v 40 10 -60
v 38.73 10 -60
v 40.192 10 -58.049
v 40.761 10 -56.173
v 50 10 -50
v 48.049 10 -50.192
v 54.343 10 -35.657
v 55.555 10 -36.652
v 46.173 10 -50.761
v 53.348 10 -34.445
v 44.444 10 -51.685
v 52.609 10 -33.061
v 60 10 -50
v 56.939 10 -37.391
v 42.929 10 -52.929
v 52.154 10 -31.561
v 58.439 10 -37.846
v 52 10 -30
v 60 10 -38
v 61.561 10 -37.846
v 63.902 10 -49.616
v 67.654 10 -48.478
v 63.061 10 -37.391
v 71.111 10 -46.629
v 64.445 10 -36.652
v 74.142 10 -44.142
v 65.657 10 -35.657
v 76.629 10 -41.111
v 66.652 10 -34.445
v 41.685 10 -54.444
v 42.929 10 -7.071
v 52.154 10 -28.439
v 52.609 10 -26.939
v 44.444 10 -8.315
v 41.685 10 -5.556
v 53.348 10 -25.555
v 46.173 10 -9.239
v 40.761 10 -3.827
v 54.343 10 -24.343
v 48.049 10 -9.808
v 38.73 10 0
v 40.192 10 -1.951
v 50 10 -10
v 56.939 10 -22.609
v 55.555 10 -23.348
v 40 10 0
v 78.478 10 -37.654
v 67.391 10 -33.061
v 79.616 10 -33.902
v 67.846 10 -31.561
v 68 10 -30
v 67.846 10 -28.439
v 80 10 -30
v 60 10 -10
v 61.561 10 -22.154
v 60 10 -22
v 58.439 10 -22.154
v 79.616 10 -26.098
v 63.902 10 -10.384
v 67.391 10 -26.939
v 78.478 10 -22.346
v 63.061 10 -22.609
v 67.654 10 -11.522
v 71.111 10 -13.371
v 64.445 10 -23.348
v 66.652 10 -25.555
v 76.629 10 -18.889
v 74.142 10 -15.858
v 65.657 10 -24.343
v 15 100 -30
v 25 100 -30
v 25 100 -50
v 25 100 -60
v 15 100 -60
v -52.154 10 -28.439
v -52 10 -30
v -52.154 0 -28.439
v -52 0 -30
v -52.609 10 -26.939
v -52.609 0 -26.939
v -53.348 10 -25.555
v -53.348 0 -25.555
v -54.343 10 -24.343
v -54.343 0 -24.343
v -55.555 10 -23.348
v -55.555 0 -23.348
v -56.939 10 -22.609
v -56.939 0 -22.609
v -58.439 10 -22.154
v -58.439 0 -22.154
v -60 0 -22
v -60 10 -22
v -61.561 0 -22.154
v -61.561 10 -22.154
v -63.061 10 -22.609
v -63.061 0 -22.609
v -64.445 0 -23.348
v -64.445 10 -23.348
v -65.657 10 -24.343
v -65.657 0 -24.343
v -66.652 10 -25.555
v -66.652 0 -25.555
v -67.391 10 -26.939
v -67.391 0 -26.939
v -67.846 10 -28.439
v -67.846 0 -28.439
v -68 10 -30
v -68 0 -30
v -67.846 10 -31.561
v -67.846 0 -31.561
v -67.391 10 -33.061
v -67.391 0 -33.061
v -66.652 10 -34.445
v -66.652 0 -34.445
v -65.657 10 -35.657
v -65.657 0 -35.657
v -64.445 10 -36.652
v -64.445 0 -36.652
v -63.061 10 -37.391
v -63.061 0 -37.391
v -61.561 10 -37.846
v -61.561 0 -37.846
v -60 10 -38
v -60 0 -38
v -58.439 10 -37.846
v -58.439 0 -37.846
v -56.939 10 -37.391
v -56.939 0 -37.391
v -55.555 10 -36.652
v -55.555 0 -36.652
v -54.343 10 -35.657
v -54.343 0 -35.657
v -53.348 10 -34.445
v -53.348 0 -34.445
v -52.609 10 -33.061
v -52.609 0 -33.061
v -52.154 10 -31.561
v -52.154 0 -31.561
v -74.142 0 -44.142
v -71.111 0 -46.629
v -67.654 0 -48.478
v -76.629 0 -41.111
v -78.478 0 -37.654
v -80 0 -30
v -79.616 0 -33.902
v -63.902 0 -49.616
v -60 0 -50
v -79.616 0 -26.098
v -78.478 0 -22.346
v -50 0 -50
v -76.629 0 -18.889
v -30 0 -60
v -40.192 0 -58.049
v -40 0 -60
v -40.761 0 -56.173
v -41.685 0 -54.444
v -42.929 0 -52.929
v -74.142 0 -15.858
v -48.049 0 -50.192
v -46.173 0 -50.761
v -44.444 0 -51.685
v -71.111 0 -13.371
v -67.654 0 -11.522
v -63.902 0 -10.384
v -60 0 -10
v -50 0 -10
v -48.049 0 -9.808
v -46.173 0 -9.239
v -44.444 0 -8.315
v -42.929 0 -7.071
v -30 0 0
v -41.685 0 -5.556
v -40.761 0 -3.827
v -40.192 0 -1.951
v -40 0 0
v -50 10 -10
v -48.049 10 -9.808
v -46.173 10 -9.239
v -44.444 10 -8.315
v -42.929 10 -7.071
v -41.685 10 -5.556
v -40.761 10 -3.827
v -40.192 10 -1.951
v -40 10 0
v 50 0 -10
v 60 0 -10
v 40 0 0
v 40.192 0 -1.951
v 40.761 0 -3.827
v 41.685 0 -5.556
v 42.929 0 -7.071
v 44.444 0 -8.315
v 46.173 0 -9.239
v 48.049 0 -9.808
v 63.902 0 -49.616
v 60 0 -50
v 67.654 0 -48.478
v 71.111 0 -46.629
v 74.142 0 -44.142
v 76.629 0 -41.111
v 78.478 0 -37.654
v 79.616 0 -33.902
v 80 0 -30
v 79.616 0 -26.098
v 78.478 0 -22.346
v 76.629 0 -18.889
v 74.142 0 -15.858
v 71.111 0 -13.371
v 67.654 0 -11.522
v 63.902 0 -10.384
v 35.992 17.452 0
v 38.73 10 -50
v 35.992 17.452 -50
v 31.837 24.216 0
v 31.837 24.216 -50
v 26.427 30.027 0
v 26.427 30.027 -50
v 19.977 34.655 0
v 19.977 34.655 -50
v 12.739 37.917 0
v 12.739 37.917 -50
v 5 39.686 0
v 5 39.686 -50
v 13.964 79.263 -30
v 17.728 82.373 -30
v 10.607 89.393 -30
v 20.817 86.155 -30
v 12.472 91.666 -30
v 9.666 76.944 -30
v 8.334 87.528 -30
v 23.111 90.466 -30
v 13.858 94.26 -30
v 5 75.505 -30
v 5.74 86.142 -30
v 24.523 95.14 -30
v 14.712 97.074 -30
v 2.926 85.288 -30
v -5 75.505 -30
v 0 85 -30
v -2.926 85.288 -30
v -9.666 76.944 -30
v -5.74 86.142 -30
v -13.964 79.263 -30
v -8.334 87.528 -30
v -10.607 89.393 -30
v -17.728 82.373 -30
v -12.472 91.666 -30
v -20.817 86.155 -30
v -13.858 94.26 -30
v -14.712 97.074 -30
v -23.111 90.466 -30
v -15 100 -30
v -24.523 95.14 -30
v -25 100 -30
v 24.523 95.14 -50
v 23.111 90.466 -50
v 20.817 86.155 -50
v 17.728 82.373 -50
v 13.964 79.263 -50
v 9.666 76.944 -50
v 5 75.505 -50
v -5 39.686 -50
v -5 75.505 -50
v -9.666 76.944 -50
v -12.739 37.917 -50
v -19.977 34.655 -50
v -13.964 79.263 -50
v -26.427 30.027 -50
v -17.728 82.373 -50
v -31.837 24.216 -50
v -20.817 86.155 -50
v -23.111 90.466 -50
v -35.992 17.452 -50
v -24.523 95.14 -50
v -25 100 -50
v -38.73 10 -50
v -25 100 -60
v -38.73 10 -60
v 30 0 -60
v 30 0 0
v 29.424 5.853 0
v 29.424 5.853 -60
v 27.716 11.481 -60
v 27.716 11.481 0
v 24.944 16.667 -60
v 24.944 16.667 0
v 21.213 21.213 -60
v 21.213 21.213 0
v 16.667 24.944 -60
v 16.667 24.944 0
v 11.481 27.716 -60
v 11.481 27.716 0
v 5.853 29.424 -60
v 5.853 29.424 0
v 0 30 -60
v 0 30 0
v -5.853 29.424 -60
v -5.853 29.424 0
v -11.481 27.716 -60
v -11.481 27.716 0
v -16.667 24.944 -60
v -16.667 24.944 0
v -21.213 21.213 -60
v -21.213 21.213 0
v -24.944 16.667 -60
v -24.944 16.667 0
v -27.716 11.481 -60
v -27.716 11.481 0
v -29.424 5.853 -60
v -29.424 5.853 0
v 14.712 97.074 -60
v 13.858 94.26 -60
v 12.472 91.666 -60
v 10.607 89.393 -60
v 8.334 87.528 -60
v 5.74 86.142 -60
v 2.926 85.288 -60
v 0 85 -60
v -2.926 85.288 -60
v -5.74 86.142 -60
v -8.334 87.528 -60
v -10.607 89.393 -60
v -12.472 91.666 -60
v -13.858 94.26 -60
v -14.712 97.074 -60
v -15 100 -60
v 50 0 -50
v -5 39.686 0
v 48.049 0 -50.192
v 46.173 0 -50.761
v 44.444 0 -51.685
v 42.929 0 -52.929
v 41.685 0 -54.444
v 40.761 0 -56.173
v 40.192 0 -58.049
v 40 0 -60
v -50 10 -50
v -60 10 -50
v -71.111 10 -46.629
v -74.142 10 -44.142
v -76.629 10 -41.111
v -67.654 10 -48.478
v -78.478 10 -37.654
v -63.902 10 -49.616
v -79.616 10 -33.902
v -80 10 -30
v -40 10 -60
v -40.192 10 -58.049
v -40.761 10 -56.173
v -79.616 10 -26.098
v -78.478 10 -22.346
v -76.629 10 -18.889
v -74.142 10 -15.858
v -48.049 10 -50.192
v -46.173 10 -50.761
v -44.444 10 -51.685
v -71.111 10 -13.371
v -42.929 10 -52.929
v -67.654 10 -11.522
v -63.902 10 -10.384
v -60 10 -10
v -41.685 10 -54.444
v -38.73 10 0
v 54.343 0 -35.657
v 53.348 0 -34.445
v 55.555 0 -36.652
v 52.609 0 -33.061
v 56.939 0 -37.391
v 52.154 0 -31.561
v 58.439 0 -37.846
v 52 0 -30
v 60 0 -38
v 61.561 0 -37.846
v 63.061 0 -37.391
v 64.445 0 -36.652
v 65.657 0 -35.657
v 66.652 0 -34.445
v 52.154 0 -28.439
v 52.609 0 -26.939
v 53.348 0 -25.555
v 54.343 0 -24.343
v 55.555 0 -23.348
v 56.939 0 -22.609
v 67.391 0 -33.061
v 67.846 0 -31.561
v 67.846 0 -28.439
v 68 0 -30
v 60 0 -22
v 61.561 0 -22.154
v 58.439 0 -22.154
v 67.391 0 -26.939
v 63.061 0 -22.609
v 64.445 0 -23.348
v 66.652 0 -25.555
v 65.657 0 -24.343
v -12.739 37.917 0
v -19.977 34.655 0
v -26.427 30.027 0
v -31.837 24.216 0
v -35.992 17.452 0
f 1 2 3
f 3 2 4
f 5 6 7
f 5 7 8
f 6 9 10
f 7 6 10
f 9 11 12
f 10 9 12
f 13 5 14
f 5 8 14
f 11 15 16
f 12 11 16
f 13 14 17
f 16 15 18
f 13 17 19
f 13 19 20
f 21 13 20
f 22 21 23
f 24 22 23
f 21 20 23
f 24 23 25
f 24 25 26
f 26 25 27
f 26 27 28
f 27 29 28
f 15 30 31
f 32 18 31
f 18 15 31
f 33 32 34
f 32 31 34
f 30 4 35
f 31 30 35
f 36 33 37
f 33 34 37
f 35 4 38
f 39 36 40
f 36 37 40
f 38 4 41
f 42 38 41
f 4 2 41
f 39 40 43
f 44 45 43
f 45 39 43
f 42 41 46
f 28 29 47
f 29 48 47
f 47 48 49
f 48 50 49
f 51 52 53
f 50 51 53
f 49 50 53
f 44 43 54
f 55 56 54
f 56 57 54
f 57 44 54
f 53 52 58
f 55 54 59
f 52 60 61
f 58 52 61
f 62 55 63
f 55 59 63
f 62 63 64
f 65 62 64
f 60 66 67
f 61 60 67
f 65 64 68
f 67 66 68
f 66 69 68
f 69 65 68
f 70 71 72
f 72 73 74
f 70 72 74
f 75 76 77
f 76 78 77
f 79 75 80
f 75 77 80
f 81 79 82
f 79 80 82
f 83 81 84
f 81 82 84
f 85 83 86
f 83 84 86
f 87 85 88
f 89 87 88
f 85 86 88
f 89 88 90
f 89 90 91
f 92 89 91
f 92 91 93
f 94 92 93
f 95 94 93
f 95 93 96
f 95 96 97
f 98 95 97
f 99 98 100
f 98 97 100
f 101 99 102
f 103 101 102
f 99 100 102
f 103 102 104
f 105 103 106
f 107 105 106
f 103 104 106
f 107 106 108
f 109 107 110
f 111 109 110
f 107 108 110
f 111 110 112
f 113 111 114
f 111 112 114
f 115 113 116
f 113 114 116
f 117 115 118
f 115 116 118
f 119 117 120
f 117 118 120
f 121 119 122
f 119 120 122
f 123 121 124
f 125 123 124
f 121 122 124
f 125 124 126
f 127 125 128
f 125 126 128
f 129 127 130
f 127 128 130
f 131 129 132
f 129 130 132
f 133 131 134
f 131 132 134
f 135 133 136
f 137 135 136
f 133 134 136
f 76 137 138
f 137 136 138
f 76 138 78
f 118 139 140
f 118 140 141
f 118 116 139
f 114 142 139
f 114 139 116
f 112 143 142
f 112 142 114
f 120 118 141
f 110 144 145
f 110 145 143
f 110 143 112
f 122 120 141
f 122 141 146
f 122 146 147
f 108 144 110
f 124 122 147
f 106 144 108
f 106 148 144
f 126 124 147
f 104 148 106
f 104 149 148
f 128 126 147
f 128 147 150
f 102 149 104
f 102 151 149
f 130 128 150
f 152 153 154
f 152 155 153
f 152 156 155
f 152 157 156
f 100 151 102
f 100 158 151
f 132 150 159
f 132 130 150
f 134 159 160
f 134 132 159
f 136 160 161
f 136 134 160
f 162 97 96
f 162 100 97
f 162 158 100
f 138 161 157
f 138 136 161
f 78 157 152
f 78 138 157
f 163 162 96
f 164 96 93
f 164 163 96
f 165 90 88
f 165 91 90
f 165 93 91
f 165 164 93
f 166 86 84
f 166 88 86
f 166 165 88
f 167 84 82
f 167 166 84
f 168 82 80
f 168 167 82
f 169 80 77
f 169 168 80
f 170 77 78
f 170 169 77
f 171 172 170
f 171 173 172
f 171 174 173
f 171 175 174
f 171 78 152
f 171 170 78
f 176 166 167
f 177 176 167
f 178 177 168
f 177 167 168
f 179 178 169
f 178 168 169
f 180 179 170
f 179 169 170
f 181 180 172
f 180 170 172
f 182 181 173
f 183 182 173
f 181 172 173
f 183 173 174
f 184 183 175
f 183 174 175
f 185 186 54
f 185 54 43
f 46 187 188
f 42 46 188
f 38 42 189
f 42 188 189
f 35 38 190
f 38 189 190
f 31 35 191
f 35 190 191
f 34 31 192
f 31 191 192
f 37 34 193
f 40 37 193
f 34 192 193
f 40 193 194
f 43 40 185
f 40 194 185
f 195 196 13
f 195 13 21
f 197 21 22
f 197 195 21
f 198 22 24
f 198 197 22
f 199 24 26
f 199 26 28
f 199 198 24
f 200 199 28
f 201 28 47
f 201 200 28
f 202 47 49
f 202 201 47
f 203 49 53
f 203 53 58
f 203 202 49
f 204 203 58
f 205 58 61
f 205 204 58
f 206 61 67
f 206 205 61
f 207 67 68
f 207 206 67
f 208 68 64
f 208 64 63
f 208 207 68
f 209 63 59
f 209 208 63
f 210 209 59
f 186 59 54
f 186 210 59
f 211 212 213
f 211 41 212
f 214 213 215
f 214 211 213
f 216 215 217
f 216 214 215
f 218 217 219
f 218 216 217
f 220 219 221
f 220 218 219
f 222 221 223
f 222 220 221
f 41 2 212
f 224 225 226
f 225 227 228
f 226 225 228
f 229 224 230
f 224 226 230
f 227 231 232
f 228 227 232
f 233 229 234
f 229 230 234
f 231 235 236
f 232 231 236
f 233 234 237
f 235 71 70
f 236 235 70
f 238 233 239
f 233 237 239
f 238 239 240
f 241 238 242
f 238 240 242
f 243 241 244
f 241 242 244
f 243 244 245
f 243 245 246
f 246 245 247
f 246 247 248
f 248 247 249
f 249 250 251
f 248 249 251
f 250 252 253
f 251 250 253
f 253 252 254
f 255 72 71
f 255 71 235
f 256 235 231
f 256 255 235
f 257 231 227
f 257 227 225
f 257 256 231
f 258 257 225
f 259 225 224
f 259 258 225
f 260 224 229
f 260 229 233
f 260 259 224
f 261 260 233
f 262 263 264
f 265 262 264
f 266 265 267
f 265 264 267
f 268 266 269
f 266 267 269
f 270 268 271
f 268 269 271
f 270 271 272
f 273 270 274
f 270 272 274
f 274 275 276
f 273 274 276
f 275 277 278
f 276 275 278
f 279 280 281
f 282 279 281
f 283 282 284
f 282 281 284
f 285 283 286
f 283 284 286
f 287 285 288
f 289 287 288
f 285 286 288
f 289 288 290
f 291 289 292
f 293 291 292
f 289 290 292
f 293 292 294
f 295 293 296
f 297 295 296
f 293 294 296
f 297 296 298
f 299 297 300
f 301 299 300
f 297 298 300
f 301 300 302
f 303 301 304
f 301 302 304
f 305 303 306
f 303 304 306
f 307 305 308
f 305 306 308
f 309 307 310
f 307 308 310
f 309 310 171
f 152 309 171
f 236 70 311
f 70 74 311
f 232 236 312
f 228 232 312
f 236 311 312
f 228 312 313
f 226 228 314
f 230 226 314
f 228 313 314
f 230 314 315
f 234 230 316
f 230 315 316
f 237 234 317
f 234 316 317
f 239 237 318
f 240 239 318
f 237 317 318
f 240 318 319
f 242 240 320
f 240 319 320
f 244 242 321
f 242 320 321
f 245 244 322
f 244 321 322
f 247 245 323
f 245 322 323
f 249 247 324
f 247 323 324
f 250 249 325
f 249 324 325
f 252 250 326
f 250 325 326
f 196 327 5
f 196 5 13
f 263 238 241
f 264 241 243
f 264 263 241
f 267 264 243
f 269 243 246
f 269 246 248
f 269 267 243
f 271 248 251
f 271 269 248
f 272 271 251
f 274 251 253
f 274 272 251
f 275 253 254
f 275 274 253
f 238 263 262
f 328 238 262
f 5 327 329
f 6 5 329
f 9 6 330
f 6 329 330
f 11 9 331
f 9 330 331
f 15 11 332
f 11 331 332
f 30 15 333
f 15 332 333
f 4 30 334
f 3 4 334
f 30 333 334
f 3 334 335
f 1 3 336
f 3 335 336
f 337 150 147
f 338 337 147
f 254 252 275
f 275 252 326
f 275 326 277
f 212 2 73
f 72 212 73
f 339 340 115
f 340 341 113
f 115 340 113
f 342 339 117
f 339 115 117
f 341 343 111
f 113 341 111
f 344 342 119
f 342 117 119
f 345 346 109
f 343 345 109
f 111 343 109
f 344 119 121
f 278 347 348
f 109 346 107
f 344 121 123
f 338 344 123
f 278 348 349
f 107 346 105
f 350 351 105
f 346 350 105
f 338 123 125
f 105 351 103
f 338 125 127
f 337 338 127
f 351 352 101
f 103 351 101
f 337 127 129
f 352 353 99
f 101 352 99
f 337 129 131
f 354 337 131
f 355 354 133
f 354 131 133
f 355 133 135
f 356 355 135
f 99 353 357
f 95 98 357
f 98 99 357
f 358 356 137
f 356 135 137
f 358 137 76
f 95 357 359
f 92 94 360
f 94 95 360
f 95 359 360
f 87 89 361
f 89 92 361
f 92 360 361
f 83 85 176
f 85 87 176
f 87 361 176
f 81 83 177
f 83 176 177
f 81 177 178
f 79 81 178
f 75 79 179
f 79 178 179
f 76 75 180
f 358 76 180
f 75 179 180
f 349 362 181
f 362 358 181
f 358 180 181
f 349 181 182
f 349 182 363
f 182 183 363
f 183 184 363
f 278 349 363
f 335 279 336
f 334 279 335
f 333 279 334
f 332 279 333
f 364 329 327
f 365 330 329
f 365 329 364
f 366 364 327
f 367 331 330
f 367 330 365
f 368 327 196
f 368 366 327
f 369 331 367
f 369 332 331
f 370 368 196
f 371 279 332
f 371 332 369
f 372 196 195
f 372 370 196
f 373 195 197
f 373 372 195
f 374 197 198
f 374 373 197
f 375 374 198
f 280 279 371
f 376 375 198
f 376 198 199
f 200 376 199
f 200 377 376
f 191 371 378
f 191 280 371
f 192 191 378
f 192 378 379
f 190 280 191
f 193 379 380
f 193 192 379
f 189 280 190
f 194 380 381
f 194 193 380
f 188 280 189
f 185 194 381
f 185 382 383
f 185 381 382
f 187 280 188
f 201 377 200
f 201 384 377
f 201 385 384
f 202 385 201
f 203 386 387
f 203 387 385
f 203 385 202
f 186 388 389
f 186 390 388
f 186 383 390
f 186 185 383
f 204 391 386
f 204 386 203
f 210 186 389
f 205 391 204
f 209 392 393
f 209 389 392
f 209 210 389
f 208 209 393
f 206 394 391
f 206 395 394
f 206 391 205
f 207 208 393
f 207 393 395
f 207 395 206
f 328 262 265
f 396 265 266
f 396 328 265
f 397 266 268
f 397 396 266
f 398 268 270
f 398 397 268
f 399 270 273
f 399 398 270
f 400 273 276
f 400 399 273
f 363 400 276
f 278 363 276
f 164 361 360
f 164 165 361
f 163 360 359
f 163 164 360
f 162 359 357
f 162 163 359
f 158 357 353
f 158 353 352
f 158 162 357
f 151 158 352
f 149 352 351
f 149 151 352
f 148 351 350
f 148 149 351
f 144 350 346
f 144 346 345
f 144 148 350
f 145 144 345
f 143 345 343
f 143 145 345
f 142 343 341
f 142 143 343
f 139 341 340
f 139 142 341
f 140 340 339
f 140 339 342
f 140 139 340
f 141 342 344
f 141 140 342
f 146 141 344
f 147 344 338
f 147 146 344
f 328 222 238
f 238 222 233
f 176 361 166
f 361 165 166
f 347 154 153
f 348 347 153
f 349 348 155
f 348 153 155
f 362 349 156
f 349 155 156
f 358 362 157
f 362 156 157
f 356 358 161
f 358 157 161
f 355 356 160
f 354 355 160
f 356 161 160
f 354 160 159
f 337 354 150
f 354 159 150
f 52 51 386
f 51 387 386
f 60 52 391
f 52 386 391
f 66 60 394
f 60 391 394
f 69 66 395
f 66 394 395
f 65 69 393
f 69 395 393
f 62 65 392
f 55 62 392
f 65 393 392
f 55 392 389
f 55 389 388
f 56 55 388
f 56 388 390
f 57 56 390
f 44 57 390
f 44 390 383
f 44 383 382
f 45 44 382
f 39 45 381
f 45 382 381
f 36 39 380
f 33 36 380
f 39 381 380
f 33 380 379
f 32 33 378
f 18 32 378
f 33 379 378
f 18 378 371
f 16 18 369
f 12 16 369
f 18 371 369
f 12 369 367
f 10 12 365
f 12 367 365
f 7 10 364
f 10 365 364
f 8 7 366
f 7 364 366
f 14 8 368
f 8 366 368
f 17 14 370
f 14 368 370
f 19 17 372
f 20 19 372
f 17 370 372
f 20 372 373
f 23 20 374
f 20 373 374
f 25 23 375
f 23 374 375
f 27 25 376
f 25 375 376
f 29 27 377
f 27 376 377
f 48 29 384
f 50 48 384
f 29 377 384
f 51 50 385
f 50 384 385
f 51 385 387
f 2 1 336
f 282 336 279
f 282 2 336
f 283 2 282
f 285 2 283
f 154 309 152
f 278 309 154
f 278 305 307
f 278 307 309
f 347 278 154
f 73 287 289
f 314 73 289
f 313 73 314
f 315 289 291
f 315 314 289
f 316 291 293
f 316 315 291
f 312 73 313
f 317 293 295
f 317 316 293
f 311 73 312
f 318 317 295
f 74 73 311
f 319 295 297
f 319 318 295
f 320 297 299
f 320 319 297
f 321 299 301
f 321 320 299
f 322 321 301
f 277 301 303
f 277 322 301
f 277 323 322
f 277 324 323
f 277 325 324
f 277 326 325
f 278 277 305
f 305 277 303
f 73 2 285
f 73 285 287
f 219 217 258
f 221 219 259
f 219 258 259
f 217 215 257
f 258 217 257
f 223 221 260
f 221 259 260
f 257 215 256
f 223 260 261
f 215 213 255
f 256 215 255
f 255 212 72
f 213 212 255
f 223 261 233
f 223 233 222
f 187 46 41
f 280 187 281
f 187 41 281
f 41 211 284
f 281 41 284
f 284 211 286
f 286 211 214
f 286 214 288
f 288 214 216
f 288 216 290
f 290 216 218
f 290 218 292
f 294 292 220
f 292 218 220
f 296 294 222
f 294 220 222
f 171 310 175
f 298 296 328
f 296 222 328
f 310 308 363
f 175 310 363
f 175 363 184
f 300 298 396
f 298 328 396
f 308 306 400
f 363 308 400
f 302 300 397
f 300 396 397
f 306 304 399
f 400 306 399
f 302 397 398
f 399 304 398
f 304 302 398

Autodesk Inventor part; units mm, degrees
ref_plane "YZ Plane" through (0, 0, 0) normal (1, 0, 0) x (0, 1, 0)
ref_plane "XZ Plane" through (0, 0, 0) normal (0, 1, 0) x (-1, 0, 0)
ref_plane "XY Plane" through (0, 0, 0) normal (0, 0, 1) x (1, 0, 0)
sketch "Náčrt2" plane through (0, 0, 0) normal (0, 0, 1) x (1, 0, 0)
  arc A0 (30, 0) -> (-30, 0) centre (0, 0) ccw
  arc A1 (40, 0) -> (-40, 0) centre (0, 0) ccw
  line L0 (-40, 0) -> (-30, 0)
  line L1 (30, 0) -> (40, 0)
  point P0 (-40, 0)
  dimension "d0" = 30
  dimension "d1" = 40
  dimension "d2" = 0
  dimension "d3" = 0
  dimension "d4" = 0
  dimension "d5" = 0
  dimension "d6" = 30
  dimension "d7" = 40
extrude "Vysunutí1" add sketch "Náčrt2" against normal blind 60
sketch "Náčrt3" plane through (30, 0, 0) normal (0, -1, 0) x (1, 0, 0)
  line L0 (10, 0) -> (-70, 0) projected
  line L1 (0, 0) -> (0, -60)
  line L2 (0, -60) -> (10, -60)
  line L3 (0, 0) -> (10, 0)
  line L4 (10, 0) -> (10, -60) projected
  line L5 (10, -60) -> (10, -60)
  line L6 (20, -50) -> (30, -50)
  line L7 (30, -10) -> (20, -10)
  line L8 (10, 0) -> (10, 0)
  arc A0 (30, -50) -> (30, -10) centre (30, -30) ccw
  circle A1 centre (30, -30) radius 8
  arc A2 (20, -50) -> (10, -60) centre (20, -60) ccw
  arc A3 (10, 0) -> (20, -10) centre (20, 0) ccw
  line L9 (-30, 0) -> (-30, -60)
  line L10 (-60, 0) -> (-60, -60)
  line L11 (-60, -60) -> (-70, -60)
  line L12 (-60, 0) -> (-70, 0)
  line L13 (-70, 0) -> (-70, -60)
  line L14 (-70, -60) -> (-70, -60)
  line L15 (-80, -50) -> (-90, -50)
  line L16 (-90, -10) -> (-80, -10)
  line L17 (-70, 0) -> (-70, 0)
  arc A4 (-90, -10) -> (-90, -50) centre (-90, -30) ccw
  circle A5 centre (-90, -30) radius 8
  arc A6 (-70, -60) -> (-80, -50) centre (-80, -60) ccw
  arc A7 (-80, -10) -> (-70, 0) centre (-80, 0) ccw
  point P0 (10, -50)
  point P1 (10, -10)
  point P2 (-70, -50)
  point P3 (-70, -10)
  dimension "d10" = 10
  dimension "d12" = 16
  dimension "d13" = 10
  dimension "d16" = 20
  dimension "d17" = 30
extrude "Vysunutí2" add sketch "Náčrt3" against normal blind 10
sketch "Sketch4" plane through (0, 0, -60) normal (0, 0, -1) x (-1, 0, 0)
  arc A0 (38.7298, 10) -> (-38.7298, 10) centre (0, 0) ccw projected
  line L0 (-38.7298, 10) -> (-25, 100)
  line L1 (25, 100) -> (38.7298, 10)
  arc A1 (38.7298, 10) -> (-38.7298, 10) centre (0, -0.1304) ccw
  line L2 (30, 0) -> (40, 0) projected
  arc A2 (-25, 100) -> (25, 100) centre (0, 100) ccw
  arc A3 (-15, 100) -> (15, 100) centre (0, 100) ccw
  line L3 (-25, 100) -> (-15, 100)
  line L4 (15, 100) -> (25, 100)
  line L5 (-5, 75.5051) -> (5, 75.5051)
  line L6 (-5, 75.5051) -> (-5, 39.589)
  line L7 (5, 75.5051) -> (5, 39.589)
  line L8 (-5, 39.589) -> (5, 39.589)
  point P0 (5, 39.6863)
  point P1 (-5, 39.6863)
  dimension "d20" = 50
  dimension "d24" = 15
  dimension "d36" = 100
  dimension "d37" = 30
  dimension "d48" = 10
  dimension "d49" = 40.0328
  dimension "d50" = 39.6863
  dimension "d51" = 39.6863
  dimension "d52" = 28.8671
  dimension "d53" = 38.7527
extrude "Extrusion3" add sketch "Sketch4" against normal blind 10 contours A0 L7 A2 L1 | A0 L0 A2 L6
extrude "Extrusion4" add sketch "Sketch4" against normal blind 30 contours A2 L5 L3 A3 L4
extrude "Extrusion5" add sketch "Sketch4" against normal blind 60 contours L7 A1 L6 A0 | A0 L6 A2 L7 | L8 A1 | A2 L5
sketch "Sketch5" plane through (5, 39.6863, -50) normal (1, 0, 0) x (0, 0, -1)
  line L0 (-50, 0) -> (-50, 35.8188) projected
  line L1 (0, 35.8188) -> (-20, 35.8188) projected
  line L2 (-50, 0) -> (-20, 35.8188)
  line L3 (-20, 35.8188) -> (-50, 35.8188)
  line L4 (-50, 35.8188) -> (-50, 0)
  point P0 (-50, -39.6863)
extrude "Extrusion6" cut sketch "Sketch5" against normal blind 10
properties part number "4"
